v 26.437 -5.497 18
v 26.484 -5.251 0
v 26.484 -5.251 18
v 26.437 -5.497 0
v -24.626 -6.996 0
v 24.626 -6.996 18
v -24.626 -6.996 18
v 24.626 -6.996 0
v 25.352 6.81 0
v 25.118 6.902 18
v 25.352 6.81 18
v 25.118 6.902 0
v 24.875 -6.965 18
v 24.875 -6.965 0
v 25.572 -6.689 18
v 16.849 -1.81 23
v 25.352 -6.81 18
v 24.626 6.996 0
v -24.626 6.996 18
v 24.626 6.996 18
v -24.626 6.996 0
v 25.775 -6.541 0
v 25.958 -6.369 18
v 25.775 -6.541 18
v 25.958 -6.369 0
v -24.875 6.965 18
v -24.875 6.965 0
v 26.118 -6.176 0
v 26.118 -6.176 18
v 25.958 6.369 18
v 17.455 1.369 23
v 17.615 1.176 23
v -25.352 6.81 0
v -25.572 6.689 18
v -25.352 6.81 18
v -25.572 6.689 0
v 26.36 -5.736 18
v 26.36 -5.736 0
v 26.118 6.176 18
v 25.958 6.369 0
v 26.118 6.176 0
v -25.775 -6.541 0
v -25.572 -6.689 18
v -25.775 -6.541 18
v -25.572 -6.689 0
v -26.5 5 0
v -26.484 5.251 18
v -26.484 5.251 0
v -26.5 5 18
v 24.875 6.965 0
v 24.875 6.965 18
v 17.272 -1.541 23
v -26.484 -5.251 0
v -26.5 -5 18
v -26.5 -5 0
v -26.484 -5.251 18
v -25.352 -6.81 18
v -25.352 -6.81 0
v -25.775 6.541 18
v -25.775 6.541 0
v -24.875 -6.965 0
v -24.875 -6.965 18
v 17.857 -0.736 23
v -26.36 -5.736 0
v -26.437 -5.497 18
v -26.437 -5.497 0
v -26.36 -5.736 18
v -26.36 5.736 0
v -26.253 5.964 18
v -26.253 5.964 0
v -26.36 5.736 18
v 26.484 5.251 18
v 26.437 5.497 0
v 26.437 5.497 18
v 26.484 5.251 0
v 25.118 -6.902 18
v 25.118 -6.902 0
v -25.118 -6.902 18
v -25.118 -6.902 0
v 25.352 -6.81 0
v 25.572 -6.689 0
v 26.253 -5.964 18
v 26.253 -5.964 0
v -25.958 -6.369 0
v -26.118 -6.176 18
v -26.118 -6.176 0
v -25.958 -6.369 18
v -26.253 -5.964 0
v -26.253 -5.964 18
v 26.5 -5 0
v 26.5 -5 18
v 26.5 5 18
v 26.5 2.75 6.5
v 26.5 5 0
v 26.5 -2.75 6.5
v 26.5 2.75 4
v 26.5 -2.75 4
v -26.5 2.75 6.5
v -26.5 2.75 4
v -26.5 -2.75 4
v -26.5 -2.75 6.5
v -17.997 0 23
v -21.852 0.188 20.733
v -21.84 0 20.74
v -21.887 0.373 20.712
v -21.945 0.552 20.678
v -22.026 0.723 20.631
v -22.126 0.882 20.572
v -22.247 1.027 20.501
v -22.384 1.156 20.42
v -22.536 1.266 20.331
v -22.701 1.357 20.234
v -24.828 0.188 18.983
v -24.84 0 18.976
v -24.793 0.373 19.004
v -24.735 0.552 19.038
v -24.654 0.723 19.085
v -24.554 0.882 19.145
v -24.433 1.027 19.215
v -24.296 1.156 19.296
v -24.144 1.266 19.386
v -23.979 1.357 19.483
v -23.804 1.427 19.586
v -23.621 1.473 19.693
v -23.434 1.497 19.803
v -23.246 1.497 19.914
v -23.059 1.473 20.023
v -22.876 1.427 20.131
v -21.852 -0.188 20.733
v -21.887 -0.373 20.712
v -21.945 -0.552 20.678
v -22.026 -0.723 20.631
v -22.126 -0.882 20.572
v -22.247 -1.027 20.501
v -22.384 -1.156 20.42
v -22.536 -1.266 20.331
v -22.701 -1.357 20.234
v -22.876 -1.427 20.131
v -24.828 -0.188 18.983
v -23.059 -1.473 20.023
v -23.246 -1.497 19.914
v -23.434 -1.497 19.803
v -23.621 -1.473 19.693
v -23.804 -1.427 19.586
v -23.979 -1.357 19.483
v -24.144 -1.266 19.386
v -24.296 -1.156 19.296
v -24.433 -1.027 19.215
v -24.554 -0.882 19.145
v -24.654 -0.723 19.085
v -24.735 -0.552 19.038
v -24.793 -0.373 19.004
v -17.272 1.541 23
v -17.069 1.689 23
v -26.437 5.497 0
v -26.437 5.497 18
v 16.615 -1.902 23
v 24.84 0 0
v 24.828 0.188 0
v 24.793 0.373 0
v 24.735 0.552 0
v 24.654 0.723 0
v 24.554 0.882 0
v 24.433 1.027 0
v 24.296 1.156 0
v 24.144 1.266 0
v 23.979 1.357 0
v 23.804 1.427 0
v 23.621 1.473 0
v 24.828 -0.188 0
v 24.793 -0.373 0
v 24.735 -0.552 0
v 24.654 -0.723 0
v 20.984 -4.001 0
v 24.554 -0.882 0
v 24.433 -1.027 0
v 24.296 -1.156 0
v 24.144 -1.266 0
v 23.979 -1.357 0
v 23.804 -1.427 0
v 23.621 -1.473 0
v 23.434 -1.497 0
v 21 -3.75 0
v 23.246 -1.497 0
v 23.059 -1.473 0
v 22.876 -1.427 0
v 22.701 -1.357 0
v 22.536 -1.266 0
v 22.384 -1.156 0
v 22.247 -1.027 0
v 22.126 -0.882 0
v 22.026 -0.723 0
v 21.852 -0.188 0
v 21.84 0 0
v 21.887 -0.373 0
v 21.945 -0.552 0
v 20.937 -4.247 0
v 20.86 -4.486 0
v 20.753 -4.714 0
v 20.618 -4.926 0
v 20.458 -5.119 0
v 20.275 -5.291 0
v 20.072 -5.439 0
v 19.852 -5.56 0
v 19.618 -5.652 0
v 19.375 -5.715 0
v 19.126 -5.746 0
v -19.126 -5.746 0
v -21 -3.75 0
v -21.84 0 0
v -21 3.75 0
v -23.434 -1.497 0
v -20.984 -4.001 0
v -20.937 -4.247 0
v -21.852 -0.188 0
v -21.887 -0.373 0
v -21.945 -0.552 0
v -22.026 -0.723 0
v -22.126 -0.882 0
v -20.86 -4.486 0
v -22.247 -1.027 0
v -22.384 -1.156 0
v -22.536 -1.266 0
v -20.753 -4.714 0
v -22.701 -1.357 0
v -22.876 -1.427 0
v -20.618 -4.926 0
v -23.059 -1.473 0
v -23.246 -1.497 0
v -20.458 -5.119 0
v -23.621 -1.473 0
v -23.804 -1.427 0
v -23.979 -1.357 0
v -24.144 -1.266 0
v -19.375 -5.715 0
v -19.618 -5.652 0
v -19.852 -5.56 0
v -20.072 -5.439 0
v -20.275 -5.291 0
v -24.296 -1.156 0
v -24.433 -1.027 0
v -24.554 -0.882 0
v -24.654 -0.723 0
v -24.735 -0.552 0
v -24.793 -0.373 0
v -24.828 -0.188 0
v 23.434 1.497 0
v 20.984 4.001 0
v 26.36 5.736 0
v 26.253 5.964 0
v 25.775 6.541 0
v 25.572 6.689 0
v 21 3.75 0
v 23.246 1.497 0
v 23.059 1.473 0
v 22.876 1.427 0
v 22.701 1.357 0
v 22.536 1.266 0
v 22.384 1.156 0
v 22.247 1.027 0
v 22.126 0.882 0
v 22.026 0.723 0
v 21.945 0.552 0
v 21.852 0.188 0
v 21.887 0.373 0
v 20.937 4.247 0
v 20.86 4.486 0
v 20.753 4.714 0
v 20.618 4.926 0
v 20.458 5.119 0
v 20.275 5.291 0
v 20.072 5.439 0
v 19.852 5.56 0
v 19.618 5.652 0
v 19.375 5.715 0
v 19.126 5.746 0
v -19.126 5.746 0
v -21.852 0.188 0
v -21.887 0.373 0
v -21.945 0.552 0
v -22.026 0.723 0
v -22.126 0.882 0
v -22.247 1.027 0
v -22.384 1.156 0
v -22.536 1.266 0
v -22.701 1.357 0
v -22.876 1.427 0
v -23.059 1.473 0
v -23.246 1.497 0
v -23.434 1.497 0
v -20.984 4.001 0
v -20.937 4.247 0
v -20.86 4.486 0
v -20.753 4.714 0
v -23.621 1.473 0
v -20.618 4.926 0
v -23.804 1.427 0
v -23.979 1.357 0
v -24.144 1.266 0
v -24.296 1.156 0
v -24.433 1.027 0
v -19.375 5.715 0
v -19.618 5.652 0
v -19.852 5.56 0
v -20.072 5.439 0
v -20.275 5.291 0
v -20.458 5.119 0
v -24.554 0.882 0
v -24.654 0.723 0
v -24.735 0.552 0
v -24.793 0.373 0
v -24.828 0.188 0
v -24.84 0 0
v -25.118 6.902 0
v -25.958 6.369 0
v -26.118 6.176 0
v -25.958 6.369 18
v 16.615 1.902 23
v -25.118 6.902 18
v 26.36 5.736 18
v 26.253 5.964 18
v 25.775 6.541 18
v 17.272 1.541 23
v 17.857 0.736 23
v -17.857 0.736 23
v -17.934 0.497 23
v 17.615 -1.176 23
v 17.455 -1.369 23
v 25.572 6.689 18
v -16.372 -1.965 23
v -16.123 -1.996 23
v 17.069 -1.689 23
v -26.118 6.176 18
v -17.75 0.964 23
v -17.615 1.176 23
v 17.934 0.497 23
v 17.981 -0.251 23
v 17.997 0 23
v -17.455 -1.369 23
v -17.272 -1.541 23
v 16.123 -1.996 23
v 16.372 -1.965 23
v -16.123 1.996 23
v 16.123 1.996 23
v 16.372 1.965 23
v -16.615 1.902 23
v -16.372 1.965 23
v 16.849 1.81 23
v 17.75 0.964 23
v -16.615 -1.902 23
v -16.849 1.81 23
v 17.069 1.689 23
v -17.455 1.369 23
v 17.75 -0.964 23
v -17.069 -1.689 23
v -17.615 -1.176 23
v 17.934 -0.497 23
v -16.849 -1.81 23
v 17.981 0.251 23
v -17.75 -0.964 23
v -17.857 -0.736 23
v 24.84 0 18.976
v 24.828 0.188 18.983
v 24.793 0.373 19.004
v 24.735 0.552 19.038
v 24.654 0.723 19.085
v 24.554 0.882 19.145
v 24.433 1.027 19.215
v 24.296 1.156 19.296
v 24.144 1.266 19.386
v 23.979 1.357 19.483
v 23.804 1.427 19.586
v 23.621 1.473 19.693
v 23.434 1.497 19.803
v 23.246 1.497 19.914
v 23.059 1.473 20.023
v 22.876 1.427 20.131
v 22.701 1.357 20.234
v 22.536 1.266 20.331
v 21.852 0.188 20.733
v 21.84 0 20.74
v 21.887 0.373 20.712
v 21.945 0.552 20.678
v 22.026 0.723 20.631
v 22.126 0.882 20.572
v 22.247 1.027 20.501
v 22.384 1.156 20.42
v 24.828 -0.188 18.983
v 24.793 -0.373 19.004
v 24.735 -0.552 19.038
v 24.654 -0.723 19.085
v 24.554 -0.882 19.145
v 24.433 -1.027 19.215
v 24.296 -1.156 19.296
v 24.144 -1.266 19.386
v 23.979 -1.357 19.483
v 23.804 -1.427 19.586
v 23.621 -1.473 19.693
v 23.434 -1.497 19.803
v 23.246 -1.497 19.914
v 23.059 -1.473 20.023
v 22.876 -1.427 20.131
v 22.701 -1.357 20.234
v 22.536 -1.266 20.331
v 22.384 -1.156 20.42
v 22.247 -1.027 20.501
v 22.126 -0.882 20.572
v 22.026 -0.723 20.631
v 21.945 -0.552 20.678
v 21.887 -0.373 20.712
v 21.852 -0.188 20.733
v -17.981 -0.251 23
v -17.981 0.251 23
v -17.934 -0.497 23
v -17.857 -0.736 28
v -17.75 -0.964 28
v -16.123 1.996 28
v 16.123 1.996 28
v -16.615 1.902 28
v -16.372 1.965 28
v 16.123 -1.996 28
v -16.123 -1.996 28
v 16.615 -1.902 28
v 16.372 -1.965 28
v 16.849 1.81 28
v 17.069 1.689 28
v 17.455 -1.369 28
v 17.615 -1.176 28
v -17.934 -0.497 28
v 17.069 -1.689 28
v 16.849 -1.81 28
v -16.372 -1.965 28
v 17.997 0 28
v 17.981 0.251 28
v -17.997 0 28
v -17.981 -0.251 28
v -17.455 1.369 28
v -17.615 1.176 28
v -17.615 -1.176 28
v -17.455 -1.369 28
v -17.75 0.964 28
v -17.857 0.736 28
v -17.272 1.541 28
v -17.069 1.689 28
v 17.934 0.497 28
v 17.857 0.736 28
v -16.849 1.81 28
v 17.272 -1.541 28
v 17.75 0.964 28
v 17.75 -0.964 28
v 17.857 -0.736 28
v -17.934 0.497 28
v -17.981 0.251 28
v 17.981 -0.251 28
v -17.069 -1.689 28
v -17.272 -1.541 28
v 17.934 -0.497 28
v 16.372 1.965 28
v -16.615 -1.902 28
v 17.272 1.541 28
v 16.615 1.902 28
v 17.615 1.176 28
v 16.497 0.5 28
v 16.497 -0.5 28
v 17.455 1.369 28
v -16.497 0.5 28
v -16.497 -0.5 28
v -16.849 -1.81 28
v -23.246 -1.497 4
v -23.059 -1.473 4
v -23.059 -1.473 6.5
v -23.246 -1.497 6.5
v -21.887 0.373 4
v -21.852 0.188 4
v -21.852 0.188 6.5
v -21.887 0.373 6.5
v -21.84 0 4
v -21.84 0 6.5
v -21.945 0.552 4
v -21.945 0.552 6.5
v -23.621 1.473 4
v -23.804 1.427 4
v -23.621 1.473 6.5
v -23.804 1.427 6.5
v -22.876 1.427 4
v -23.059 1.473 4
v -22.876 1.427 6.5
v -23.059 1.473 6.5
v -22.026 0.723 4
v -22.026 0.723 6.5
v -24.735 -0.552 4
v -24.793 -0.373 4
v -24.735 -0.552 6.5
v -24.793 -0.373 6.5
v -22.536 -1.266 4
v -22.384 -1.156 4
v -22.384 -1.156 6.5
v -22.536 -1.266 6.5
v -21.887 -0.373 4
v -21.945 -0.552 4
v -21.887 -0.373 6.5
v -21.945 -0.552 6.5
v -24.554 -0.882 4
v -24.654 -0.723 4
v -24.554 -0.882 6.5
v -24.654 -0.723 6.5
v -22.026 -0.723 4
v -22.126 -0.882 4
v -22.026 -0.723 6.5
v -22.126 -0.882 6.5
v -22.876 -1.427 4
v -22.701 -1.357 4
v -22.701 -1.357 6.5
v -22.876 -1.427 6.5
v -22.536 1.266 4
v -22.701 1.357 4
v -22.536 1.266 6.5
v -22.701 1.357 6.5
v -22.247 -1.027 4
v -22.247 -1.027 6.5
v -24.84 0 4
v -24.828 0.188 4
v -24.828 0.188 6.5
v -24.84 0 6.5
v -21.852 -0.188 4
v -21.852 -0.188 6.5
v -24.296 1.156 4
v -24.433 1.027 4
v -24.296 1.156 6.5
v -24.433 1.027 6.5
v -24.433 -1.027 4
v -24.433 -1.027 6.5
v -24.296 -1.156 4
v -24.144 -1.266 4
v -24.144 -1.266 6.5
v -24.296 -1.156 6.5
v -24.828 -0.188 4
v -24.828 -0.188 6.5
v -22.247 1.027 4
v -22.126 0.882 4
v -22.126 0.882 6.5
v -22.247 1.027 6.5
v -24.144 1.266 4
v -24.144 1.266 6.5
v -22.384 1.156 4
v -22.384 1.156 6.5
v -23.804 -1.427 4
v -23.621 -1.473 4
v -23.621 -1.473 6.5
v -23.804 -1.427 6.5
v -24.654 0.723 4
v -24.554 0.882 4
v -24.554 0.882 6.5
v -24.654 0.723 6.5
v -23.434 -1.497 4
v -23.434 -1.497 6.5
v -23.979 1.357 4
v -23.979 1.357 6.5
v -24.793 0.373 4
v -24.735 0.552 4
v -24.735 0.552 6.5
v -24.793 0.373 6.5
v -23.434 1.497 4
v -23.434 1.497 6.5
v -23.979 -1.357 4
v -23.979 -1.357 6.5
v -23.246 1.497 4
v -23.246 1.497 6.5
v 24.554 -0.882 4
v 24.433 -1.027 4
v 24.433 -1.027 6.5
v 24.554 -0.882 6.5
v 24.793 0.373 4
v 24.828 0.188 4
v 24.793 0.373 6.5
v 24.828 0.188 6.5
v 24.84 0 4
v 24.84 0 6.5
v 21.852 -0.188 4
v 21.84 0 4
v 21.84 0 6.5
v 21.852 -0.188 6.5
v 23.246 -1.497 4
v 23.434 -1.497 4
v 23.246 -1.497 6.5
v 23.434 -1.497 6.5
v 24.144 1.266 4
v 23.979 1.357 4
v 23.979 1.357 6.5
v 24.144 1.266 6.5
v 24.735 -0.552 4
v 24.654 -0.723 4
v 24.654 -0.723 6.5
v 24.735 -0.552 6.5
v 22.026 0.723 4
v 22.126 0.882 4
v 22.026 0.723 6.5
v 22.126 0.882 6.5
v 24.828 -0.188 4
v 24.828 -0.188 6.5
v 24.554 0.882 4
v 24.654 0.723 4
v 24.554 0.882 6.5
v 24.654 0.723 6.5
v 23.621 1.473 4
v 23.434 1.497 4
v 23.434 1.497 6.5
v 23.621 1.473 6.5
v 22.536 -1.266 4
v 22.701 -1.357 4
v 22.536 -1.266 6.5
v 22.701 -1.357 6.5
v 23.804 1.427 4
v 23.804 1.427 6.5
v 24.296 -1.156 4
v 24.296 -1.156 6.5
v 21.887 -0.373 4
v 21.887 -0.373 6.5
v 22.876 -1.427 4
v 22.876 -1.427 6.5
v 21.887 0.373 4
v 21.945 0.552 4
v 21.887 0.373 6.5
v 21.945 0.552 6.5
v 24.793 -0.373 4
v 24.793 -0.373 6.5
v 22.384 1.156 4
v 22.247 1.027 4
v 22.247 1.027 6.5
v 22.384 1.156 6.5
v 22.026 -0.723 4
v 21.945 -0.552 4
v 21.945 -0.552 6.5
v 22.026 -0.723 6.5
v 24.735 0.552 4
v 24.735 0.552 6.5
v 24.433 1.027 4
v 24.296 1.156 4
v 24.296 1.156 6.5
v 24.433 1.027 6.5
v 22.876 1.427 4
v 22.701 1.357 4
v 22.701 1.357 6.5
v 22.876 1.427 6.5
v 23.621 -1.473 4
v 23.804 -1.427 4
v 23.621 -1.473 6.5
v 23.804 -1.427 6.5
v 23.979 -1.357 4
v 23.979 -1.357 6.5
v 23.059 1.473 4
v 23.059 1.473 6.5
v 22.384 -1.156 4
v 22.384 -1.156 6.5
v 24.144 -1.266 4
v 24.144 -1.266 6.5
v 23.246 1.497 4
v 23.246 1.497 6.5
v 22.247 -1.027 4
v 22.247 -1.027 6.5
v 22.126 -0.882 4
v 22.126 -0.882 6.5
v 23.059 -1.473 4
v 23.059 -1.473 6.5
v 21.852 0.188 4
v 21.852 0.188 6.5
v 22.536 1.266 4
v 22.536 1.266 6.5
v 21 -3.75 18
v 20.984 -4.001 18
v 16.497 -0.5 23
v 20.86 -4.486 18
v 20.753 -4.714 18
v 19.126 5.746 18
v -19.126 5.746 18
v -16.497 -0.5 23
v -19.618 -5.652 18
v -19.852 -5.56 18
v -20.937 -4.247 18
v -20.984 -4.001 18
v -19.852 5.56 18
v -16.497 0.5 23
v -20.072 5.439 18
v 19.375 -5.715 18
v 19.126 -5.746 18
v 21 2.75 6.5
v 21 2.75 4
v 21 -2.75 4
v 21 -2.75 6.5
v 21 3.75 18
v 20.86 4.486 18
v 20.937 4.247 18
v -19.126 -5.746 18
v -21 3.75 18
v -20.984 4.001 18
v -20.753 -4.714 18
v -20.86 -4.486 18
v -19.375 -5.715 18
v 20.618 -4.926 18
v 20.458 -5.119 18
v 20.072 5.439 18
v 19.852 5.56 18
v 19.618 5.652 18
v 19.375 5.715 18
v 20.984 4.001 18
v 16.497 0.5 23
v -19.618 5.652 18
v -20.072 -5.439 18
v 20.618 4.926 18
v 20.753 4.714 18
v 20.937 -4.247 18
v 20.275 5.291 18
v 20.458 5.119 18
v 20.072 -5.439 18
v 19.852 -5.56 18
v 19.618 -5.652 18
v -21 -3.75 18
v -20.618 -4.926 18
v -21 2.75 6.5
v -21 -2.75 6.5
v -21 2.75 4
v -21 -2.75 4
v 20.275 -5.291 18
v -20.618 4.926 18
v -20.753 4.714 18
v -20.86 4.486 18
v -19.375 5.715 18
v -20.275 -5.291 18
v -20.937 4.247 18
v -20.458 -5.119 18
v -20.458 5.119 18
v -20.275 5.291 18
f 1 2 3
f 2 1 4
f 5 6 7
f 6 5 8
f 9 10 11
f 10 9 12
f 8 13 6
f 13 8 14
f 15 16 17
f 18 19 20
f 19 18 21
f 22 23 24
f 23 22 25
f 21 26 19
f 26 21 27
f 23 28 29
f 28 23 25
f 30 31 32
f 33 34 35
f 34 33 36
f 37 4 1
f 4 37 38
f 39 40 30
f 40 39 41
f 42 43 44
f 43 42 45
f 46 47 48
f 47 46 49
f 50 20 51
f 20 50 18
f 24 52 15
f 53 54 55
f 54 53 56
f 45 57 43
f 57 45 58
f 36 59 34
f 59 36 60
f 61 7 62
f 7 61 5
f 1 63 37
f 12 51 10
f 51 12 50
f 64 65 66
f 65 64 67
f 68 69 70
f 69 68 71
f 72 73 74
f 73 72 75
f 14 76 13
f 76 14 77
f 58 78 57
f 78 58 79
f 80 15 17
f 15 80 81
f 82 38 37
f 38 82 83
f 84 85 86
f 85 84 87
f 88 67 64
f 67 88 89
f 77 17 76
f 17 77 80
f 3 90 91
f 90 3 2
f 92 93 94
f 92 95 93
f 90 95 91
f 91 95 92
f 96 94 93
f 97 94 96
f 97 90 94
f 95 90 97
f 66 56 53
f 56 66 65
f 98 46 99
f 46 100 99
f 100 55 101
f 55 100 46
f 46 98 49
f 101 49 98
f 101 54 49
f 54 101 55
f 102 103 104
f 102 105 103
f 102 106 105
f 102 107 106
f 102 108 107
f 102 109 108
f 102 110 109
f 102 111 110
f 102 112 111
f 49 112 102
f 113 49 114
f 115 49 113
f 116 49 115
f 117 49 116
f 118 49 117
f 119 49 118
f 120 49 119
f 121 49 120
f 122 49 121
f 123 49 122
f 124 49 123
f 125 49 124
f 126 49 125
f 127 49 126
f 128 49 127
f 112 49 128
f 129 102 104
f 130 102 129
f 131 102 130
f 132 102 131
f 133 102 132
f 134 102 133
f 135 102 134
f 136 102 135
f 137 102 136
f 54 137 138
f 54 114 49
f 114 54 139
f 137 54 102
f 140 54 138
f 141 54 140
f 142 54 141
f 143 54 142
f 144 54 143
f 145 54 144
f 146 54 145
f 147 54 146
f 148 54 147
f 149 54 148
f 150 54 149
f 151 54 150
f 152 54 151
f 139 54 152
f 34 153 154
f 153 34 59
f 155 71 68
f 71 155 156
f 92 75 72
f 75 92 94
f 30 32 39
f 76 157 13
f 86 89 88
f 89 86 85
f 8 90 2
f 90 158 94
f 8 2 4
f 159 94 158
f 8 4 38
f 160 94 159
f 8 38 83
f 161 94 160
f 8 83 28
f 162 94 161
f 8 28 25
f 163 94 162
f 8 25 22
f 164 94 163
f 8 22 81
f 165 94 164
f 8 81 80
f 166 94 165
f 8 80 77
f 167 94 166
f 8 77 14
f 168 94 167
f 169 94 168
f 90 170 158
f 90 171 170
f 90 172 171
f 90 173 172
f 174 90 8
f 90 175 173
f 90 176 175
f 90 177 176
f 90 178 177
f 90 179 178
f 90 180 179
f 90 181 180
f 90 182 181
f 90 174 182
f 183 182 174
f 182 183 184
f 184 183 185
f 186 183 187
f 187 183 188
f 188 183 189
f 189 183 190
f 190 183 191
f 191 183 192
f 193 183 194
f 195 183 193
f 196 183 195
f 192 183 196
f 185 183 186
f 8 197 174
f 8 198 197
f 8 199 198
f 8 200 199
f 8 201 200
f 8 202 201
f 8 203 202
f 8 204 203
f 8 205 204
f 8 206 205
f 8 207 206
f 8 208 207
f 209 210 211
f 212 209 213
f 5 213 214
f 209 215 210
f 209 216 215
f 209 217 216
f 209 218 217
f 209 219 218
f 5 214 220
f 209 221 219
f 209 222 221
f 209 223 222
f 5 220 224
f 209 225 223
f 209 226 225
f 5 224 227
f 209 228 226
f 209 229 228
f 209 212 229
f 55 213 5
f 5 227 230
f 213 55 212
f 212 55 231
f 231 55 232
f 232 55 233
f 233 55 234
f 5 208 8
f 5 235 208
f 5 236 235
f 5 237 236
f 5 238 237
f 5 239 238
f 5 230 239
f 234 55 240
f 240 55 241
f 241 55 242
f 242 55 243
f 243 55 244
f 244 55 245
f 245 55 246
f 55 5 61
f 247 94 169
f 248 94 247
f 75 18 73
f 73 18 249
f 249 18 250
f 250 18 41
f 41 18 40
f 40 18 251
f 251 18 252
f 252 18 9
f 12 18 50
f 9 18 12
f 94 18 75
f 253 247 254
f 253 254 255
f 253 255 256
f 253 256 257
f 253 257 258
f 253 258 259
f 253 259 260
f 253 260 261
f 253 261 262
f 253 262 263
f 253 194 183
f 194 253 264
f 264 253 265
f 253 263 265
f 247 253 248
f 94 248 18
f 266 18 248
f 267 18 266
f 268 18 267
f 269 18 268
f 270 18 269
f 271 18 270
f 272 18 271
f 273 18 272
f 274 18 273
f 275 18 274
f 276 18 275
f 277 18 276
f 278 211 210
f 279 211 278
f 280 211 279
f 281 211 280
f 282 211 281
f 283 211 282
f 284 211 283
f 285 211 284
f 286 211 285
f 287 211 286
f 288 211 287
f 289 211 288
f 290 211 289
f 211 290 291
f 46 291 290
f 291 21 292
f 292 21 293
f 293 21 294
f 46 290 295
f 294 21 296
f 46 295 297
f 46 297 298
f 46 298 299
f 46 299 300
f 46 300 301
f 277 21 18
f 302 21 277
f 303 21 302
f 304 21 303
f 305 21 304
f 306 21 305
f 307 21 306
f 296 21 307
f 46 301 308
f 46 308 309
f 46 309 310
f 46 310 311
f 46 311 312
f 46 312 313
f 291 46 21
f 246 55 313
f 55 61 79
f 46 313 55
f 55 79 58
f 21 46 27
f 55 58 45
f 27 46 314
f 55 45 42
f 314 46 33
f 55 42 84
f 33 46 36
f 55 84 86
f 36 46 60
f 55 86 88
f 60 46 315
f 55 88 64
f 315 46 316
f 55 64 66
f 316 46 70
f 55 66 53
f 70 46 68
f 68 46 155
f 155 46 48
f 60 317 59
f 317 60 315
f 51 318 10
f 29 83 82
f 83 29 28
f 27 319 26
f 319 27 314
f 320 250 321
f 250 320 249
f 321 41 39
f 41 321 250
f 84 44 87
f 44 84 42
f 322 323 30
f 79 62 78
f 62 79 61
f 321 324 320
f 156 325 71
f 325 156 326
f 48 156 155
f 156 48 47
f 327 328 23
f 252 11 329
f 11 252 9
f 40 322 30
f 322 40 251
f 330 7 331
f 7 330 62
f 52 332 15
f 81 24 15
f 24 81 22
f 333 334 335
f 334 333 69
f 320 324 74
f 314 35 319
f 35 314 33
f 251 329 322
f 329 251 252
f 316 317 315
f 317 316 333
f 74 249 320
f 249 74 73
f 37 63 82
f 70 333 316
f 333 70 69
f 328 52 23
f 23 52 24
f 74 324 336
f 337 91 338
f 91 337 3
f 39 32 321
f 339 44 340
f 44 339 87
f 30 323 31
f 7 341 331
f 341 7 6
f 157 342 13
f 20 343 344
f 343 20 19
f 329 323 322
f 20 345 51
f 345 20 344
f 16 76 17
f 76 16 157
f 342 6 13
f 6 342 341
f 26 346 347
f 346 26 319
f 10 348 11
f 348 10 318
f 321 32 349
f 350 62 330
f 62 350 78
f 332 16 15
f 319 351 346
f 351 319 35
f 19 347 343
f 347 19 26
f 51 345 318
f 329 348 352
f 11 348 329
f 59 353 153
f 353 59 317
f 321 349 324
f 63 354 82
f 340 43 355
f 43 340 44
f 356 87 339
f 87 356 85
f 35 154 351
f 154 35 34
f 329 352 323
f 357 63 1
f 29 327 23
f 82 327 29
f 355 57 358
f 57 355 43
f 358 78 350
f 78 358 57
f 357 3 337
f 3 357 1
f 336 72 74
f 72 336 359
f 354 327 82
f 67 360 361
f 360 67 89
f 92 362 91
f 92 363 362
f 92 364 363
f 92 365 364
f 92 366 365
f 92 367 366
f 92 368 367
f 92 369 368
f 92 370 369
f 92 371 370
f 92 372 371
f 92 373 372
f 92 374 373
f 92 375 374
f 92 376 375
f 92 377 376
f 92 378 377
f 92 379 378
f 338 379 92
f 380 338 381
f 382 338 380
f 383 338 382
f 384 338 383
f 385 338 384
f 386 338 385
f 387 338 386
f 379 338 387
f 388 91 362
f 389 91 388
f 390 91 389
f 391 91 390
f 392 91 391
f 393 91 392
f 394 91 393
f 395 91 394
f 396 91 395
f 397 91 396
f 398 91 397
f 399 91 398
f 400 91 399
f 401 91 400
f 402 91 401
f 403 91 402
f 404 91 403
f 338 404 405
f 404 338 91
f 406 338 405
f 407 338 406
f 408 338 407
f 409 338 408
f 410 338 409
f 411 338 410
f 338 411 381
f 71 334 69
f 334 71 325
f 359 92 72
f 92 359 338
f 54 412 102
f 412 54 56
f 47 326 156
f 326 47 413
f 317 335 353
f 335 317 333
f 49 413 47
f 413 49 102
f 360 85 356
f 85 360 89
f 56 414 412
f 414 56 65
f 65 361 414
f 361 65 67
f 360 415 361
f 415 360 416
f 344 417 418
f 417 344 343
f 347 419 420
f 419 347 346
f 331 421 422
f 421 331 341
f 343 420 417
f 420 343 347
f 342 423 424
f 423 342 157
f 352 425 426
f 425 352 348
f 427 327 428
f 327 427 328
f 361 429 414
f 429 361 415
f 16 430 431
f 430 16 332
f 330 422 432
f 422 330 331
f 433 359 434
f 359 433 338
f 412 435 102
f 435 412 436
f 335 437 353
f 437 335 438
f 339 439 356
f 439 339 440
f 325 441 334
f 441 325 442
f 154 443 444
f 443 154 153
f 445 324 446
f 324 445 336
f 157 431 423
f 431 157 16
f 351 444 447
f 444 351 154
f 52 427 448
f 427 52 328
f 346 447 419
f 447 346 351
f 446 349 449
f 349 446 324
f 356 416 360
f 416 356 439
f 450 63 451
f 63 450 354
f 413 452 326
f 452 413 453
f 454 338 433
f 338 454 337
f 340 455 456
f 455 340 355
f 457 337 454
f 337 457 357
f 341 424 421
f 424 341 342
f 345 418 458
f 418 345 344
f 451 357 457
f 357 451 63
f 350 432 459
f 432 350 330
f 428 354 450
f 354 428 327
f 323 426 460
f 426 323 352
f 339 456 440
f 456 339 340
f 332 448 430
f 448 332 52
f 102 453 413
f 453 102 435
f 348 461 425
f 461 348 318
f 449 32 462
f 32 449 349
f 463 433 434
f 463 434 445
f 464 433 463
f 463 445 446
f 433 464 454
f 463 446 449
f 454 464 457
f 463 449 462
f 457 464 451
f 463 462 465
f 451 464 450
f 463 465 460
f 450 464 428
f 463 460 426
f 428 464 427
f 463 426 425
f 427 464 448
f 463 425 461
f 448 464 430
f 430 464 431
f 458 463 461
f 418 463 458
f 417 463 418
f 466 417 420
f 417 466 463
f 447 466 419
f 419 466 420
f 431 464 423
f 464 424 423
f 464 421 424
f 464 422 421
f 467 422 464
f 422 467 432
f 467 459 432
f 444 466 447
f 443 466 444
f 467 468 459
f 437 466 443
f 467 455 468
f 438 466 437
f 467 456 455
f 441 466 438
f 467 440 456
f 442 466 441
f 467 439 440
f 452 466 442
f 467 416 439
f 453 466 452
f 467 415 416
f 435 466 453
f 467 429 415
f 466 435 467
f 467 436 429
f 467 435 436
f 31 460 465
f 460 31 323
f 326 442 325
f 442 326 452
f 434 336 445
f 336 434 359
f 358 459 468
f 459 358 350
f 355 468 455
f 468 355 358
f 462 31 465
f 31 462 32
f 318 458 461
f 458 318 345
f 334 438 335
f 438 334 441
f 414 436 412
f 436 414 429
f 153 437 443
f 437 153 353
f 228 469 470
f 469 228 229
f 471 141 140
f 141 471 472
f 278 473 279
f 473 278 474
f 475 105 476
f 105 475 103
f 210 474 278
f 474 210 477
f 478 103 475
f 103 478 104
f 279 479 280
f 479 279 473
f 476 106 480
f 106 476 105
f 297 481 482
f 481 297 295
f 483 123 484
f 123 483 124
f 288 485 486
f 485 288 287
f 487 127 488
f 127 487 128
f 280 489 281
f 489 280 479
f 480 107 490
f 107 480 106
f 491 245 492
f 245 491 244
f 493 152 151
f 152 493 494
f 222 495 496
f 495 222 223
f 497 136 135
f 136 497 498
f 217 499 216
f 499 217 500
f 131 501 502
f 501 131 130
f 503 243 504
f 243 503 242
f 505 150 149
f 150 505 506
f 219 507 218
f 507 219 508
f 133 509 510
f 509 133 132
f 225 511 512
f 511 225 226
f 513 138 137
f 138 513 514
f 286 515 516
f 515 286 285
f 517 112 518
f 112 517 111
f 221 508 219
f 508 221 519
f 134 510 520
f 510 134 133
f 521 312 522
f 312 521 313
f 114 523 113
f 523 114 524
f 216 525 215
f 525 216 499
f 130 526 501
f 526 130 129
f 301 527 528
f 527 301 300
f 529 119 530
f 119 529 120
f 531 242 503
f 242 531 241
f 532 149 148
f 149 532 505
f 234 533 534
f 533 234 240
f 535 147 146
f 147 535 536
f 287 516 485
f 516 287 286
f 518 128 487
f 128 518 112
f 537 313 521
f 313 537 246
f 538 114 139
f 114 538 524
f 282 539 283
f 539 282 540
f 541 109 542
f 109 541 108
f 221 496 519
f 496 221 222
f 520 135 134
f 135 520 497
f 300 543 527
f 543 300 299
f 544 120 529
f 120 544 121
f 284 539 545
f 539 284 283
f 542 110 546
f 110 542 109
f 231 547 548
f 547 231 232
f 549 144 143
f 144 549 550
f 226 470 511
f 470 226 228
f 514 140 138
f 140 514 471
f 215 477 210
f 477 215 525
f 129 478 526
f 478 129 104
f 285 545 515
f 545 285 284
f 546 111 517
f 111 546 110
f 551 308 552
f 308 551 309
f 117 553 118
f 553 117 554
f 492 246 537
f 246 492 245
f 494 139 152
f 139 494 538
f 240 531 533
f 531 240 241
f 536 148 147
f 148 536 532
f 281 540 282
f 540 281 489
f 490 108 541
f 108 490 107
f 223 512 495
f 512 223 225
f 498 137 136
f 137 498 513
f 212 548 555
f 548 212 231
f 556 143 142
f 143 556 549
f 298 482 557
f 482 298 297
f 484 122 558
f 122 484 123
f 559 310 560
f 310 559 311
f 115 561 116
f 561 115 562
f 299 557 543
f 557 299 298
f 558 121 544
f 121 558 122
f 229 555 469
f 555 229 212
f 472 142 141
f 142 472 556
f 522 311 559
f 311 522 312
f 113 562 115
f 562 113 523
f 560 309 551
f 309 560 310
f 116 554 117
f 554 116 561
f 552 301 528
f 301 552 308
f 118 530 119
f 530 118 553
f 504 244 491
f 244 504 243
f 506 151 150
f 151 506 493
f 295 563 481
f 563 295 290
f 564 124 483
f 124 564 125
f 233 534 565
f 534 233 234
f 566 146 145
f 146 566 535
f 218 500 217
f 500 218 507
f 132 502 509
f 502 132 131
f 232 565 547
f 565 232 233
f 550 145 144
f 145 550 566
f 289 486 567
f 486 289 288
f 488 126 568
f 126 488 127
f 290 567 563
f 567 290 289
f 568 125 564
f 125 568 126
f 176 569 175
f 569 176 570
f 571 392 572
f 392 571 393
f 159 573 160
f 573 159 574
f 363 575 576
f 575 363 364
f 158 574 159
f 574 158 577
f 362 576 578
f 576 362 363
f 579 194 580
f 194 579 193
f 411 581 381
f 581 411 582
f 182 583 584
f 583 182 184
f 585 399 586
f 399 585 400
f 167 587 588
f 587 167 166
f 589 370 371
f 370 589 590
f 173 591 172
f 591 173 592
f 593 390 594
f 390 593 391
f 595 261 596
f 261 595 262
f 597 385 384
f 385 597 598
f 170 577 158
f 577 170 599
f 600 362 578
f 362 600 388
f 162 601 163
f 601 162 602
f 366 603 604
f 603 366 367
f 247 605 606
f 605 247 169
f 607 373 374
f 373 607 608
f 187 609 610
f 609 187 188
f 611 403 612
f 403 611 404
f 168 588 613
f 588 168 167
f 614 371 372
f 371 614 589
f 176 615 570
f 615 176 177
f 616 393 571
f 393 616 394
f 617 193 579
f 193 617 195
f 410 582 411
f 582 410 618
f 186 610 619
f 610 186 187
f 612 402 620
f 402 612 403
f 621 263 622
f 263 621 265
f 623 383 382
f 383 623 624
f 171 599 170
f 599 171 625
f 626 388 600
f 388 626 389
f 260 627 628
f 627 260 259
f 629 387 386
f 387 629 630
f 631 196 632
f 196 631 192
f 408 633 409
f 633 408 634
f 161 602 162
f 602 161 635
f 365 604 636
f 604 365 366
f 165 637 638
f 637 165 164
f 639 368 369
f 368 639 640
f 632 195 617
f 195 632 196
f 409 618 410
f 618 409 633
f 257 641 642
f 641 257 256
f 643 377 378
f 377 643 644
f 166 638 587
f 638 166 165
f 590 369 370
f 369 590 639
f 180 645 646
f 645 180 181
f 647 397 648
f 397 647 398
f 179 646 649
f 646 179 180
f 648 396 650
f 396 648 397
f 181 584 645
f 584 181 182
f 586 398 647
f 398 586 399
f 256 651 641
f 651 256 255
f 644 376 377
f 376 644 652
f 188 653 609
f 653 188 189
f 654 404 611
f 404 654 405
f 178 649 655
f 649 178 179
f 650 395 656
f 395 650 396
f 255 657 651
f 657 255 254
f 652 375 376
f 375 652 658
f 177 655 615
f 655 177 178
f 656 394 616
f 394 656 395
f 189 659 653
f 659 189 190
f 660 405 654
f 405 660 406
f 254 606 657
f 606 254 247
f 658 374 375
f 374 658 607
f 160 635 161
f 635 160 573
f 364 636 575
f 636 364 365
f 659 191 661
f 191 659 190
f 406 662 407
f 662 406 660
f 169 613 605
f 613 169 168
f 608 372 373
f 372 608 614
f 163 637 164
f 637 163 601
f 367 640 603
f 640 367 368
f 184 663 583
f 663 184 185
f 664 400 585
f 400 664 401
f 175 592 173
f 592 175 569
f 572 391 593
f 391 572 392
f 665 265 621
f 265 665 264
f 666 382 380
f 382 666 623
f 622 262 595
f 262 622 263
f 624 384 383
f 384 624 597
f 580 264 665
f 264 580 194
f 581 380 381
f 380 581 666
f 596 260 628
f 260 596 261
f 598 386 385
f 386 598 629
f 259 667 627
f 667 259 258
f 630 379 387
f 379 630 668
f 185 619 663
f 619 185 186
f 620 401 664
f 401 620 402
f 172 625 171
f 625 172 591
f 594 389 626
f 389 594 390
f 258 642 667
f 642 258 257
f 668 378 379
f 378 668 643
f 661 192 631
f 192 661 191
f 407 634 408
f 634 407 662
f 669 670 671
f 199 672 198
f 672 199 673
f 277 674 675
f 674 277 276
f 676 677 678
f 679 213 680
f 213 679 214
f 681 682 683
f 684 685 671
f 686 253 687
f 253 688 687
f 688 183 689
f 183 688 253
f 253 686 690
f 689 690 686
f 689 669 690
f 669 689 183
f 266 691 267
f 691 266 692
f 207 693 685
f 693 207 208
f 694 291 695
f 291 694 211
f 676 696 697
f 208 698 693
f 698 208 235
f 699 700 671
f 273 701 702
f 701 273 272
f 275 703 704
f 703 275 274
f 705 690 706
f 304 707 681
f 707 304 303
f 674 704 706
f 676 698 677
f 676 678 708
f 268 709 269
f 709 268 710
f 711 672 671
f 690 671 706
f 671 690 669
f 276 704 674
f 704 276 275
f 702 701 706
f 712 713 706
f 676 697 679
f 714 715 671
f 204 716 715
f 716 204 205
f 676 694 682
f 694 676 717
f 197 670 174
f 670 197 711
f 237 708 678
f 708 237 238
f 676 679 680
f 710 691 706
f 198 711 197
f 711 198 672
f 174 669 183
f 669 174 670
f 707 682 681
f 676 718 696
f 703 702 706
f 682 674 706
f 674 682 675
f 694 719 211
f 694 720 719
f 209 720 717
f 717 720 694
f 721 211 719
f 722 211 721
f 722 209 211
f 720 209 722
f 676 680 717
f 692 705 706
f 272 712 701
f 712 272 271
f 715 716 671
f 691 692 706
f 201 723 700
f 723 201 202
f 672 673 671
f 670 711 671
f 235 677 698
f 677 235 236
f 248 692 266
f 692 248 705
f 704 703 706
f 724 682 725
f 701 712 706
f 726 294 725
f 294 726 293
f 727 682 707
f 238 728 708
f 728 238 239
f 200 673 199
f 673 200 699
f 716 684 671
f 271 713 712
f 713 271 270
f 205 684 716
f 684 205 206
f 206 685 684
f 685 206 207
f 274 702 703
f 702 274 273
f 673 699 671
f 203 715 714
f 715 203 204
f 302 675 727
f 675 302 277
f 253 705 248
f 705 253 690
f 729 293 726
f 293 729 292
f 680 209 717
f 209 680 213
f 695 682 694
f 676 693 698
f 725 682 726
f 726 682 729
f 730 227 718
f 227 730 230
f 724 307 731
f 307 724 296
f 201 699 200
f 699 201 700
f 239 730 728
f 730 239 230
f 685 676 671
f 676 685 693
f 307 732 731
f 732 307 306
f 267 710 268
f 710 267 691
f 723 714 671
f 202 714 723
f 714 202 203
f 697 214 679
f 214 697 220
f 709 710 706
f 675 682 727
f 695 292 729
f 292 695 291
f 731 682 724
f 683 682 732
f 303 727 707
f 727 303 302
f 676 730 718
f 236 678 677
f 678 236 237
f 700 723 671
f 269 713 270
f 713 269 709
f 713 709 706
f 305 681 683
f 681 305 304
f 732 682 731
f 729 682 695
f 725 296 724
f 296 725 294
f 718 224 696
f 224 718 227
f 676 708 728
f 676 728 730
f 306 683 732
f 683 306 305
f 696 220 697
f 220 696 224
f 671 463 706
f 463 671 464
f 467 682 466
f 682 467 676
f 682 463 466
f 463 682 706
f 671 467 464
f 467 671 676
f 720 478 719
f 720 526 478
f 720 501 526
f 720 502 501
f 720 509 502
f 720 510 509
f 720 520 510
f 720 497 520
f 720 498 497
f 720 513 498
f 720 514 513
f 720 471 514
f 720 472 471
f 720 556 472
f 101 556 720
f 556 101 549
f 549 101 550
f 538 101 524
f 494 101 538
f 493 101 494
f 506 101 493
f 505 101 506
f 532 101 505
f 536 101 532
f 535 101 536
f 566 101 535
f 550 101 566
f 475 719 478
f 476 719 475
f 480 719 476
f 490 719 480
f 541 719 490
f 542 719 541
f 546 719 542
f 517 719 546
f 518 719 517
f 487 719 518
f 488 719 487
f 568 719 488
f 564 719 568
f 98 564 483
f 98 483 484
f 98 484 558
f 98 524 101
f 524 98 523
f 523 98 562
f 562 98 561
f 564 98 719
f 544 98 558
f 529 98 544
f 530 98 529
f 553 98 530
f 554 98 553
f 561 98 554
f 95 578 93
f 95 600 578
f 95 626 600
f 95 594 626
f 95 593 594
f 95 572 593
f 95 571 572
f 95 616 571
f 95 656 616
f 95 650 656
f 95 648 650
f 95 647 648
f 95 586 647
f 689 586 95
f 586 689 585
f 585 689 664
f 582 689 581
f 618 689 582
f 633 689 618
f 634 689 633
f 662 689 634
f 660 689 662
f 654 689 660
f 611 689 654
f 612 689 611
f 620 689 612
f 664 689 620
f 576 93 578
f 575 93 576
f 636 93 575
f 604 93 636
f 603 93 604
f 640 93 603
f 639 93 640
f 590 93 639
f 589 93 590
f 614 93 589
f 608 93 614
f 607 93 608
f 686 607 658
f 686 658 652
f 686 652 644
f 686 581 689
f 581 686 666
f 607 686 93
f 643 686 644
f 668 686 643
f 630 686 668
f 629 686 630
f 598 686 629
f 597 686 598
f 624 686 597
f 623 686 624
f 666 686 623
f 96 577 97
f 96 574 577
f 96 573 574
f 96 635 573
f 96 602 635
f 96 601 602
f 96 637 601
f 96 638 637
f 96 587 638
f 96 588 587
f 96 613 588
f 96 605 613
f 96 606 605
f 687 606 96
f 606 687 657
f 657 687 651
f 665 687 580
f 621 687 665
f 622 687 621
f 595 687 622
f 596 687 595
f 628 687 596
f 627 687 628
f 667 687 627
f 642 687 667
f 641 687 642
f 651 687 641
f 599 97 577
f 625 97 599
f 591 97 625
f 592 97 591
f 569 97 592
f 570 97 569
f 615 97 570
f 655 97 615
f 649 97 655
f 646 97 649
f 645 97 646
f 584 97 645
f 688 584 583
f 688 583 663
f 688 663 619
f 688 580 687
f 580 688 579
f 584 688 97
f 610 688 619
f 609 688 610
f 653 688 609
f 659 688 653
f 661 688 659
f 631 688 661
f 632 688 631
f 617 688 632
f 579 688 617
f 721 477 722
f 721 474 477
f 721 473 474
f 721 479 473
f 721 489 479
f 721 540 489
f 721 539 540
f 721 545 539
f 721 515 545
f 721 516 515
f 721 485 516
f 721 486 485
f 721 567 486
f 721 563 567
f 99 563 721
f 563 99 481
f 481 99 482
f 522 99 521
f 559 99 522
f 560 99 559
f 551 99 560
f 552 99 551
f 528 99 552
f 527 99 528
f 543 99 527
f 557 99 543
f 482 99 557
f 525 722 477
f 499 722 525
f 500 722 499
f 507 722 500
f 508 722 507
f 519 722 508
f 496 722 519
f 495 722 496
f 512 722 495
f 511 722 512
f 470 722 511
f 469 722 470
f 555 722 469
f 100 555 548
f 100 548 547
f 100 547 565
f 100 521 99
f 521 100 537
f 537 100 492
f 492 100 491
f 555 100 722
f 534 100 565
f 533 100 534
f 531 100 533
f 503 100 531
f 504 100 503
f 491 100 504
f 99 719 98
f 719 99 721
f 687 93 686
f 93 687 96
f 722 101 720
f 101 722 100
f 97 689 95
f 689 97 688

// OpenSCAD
// file: lib/chassis-connector-housing.scad
// Chassis Connector Housing
// By Hans Christian Saustrup <hc@saustrup.net>
model_version = "v0.0.1";

t = 1.5;

module flat_rounded_cube(size, d=4) {
    _size = [
        size.x - d,
        size.y - d,
        size.z
    ];

    translate([d/2, d/2])
    hull()
    for (x=[0, 1])
    for (y=[0, 1])
    translate([
        x * _size.x,
        y * _size.y,
        0
    ])
    cylinder(d=d, h=_size.z);
}

module _cube(size, d=4) {
    flat_rounded_cube(size, d);
    // cube(size);
}

module __generic_chassis_connector_housing(cutout, screw_distance, wires, nut_width, nut_height, nut_spacing = 4, screw_diameter = 3, hole_through = true) {

    echo(["Cutout:", cutout]);
    echo(["Screw distance:", screw_distance]);

    // Flat cable - leave room for one extra wire
    cable_pitch = 1.269;
    cable_hole = [wires * cable_pitch, 1, 5];

    house1 = [
        screw_distance + 6.32,
        cutout.y + 1 + t,
        18
    ];

    house1_cutout = [
        cutout.x,
        cutout.y,
        house1.z
    ];

    house2 = [
        cable_hole.x + (2*t),
        cable_hole.y + (2*t),
        cable_hole.z
    ];
    house2_cutout = cable_hole;

    screw_cutout = [
        house1.x,
        nut_width,
        nut_height
    ];

    difference() {
        union() {
            hull() {
                translate([-house1.x/2, -house1.y/2])
                _cube(house1, d=4);
                translate([-house2.x/2, -house2.y/2, house1.z])
                _cube(house2);
            }
            translate([-house2.x/2, -house2.y/2, house1.z + house2.z])
            _cube(house2);
        }
        union() {
            hull() {
                translate([-house1_cutout.x/2, -house1_cutout.y/2])
                _cube(house1_cutout);
                translate([-house2_cutout.x/2, -house2_cutout.y/2, house1.z])
                cube(house2_cutout);
            }
            translate([-house2_cutout.x/2, -house2_cutout.y/2, house1.z + house2.z])
            cube(house2_cutout);

            translate([-screw_cutout.x/2, -screw_cutout.y/2, nut_spacing])
            cube(screw_cutout);

            for (x=[-0.5,0.5])
            translate([screw_distance*x, 0])
            cylinder(r=screw_diameter/2, h= house1.z + (hole_through ? house1.z : 0));
        }
    }

}

module chassis_connector_housing_db(pins, wires=0) {
    // Row with most pins:
    maxpins = pins - floor(pins/2);

    pin_pitch = 2.775;
    pin_width = 1.7;
    pin_to_pin = (maxpins-1) * pin_pitch + pin_width;

    inside = [
        pin_to_pin + 7,
        11.5,
        5
    ];

    screw_distance = inside.x + 4.68;
    __generic_chassis_connector_housing(
        inside,
        screw_distance = screw_distance,
        wires = wires != 0 ? wires : pins + 1,
        nut_width = 5.5,
        nut_height = 2.5,
        screw_diameter = 3
    );
}

module chassis_connector_housing_centronics(pins, wires=0) {
    pin_columns = pins / 2;

    pin_pitch = 2.11;
    pin_width = 1.20;
    pin_to_pin = (pin_columns - 1) * pin_pitch + pin_width;

    __generic_chassis_connector_housing(
        [
            pin_to_pin + 10.5,
            15,
            3.5
        ],
        pin_to_pin + 22.5,
        wires,
        nut_height = 2.0,
        nut_width = 5.0,
        screw_diameter = 2.5
    );
}
// main file
use <lib/chassis-connector-housing.scad>;

$fn = $preview ? 0 : 50;

chassis_connector_housing_db(25);
